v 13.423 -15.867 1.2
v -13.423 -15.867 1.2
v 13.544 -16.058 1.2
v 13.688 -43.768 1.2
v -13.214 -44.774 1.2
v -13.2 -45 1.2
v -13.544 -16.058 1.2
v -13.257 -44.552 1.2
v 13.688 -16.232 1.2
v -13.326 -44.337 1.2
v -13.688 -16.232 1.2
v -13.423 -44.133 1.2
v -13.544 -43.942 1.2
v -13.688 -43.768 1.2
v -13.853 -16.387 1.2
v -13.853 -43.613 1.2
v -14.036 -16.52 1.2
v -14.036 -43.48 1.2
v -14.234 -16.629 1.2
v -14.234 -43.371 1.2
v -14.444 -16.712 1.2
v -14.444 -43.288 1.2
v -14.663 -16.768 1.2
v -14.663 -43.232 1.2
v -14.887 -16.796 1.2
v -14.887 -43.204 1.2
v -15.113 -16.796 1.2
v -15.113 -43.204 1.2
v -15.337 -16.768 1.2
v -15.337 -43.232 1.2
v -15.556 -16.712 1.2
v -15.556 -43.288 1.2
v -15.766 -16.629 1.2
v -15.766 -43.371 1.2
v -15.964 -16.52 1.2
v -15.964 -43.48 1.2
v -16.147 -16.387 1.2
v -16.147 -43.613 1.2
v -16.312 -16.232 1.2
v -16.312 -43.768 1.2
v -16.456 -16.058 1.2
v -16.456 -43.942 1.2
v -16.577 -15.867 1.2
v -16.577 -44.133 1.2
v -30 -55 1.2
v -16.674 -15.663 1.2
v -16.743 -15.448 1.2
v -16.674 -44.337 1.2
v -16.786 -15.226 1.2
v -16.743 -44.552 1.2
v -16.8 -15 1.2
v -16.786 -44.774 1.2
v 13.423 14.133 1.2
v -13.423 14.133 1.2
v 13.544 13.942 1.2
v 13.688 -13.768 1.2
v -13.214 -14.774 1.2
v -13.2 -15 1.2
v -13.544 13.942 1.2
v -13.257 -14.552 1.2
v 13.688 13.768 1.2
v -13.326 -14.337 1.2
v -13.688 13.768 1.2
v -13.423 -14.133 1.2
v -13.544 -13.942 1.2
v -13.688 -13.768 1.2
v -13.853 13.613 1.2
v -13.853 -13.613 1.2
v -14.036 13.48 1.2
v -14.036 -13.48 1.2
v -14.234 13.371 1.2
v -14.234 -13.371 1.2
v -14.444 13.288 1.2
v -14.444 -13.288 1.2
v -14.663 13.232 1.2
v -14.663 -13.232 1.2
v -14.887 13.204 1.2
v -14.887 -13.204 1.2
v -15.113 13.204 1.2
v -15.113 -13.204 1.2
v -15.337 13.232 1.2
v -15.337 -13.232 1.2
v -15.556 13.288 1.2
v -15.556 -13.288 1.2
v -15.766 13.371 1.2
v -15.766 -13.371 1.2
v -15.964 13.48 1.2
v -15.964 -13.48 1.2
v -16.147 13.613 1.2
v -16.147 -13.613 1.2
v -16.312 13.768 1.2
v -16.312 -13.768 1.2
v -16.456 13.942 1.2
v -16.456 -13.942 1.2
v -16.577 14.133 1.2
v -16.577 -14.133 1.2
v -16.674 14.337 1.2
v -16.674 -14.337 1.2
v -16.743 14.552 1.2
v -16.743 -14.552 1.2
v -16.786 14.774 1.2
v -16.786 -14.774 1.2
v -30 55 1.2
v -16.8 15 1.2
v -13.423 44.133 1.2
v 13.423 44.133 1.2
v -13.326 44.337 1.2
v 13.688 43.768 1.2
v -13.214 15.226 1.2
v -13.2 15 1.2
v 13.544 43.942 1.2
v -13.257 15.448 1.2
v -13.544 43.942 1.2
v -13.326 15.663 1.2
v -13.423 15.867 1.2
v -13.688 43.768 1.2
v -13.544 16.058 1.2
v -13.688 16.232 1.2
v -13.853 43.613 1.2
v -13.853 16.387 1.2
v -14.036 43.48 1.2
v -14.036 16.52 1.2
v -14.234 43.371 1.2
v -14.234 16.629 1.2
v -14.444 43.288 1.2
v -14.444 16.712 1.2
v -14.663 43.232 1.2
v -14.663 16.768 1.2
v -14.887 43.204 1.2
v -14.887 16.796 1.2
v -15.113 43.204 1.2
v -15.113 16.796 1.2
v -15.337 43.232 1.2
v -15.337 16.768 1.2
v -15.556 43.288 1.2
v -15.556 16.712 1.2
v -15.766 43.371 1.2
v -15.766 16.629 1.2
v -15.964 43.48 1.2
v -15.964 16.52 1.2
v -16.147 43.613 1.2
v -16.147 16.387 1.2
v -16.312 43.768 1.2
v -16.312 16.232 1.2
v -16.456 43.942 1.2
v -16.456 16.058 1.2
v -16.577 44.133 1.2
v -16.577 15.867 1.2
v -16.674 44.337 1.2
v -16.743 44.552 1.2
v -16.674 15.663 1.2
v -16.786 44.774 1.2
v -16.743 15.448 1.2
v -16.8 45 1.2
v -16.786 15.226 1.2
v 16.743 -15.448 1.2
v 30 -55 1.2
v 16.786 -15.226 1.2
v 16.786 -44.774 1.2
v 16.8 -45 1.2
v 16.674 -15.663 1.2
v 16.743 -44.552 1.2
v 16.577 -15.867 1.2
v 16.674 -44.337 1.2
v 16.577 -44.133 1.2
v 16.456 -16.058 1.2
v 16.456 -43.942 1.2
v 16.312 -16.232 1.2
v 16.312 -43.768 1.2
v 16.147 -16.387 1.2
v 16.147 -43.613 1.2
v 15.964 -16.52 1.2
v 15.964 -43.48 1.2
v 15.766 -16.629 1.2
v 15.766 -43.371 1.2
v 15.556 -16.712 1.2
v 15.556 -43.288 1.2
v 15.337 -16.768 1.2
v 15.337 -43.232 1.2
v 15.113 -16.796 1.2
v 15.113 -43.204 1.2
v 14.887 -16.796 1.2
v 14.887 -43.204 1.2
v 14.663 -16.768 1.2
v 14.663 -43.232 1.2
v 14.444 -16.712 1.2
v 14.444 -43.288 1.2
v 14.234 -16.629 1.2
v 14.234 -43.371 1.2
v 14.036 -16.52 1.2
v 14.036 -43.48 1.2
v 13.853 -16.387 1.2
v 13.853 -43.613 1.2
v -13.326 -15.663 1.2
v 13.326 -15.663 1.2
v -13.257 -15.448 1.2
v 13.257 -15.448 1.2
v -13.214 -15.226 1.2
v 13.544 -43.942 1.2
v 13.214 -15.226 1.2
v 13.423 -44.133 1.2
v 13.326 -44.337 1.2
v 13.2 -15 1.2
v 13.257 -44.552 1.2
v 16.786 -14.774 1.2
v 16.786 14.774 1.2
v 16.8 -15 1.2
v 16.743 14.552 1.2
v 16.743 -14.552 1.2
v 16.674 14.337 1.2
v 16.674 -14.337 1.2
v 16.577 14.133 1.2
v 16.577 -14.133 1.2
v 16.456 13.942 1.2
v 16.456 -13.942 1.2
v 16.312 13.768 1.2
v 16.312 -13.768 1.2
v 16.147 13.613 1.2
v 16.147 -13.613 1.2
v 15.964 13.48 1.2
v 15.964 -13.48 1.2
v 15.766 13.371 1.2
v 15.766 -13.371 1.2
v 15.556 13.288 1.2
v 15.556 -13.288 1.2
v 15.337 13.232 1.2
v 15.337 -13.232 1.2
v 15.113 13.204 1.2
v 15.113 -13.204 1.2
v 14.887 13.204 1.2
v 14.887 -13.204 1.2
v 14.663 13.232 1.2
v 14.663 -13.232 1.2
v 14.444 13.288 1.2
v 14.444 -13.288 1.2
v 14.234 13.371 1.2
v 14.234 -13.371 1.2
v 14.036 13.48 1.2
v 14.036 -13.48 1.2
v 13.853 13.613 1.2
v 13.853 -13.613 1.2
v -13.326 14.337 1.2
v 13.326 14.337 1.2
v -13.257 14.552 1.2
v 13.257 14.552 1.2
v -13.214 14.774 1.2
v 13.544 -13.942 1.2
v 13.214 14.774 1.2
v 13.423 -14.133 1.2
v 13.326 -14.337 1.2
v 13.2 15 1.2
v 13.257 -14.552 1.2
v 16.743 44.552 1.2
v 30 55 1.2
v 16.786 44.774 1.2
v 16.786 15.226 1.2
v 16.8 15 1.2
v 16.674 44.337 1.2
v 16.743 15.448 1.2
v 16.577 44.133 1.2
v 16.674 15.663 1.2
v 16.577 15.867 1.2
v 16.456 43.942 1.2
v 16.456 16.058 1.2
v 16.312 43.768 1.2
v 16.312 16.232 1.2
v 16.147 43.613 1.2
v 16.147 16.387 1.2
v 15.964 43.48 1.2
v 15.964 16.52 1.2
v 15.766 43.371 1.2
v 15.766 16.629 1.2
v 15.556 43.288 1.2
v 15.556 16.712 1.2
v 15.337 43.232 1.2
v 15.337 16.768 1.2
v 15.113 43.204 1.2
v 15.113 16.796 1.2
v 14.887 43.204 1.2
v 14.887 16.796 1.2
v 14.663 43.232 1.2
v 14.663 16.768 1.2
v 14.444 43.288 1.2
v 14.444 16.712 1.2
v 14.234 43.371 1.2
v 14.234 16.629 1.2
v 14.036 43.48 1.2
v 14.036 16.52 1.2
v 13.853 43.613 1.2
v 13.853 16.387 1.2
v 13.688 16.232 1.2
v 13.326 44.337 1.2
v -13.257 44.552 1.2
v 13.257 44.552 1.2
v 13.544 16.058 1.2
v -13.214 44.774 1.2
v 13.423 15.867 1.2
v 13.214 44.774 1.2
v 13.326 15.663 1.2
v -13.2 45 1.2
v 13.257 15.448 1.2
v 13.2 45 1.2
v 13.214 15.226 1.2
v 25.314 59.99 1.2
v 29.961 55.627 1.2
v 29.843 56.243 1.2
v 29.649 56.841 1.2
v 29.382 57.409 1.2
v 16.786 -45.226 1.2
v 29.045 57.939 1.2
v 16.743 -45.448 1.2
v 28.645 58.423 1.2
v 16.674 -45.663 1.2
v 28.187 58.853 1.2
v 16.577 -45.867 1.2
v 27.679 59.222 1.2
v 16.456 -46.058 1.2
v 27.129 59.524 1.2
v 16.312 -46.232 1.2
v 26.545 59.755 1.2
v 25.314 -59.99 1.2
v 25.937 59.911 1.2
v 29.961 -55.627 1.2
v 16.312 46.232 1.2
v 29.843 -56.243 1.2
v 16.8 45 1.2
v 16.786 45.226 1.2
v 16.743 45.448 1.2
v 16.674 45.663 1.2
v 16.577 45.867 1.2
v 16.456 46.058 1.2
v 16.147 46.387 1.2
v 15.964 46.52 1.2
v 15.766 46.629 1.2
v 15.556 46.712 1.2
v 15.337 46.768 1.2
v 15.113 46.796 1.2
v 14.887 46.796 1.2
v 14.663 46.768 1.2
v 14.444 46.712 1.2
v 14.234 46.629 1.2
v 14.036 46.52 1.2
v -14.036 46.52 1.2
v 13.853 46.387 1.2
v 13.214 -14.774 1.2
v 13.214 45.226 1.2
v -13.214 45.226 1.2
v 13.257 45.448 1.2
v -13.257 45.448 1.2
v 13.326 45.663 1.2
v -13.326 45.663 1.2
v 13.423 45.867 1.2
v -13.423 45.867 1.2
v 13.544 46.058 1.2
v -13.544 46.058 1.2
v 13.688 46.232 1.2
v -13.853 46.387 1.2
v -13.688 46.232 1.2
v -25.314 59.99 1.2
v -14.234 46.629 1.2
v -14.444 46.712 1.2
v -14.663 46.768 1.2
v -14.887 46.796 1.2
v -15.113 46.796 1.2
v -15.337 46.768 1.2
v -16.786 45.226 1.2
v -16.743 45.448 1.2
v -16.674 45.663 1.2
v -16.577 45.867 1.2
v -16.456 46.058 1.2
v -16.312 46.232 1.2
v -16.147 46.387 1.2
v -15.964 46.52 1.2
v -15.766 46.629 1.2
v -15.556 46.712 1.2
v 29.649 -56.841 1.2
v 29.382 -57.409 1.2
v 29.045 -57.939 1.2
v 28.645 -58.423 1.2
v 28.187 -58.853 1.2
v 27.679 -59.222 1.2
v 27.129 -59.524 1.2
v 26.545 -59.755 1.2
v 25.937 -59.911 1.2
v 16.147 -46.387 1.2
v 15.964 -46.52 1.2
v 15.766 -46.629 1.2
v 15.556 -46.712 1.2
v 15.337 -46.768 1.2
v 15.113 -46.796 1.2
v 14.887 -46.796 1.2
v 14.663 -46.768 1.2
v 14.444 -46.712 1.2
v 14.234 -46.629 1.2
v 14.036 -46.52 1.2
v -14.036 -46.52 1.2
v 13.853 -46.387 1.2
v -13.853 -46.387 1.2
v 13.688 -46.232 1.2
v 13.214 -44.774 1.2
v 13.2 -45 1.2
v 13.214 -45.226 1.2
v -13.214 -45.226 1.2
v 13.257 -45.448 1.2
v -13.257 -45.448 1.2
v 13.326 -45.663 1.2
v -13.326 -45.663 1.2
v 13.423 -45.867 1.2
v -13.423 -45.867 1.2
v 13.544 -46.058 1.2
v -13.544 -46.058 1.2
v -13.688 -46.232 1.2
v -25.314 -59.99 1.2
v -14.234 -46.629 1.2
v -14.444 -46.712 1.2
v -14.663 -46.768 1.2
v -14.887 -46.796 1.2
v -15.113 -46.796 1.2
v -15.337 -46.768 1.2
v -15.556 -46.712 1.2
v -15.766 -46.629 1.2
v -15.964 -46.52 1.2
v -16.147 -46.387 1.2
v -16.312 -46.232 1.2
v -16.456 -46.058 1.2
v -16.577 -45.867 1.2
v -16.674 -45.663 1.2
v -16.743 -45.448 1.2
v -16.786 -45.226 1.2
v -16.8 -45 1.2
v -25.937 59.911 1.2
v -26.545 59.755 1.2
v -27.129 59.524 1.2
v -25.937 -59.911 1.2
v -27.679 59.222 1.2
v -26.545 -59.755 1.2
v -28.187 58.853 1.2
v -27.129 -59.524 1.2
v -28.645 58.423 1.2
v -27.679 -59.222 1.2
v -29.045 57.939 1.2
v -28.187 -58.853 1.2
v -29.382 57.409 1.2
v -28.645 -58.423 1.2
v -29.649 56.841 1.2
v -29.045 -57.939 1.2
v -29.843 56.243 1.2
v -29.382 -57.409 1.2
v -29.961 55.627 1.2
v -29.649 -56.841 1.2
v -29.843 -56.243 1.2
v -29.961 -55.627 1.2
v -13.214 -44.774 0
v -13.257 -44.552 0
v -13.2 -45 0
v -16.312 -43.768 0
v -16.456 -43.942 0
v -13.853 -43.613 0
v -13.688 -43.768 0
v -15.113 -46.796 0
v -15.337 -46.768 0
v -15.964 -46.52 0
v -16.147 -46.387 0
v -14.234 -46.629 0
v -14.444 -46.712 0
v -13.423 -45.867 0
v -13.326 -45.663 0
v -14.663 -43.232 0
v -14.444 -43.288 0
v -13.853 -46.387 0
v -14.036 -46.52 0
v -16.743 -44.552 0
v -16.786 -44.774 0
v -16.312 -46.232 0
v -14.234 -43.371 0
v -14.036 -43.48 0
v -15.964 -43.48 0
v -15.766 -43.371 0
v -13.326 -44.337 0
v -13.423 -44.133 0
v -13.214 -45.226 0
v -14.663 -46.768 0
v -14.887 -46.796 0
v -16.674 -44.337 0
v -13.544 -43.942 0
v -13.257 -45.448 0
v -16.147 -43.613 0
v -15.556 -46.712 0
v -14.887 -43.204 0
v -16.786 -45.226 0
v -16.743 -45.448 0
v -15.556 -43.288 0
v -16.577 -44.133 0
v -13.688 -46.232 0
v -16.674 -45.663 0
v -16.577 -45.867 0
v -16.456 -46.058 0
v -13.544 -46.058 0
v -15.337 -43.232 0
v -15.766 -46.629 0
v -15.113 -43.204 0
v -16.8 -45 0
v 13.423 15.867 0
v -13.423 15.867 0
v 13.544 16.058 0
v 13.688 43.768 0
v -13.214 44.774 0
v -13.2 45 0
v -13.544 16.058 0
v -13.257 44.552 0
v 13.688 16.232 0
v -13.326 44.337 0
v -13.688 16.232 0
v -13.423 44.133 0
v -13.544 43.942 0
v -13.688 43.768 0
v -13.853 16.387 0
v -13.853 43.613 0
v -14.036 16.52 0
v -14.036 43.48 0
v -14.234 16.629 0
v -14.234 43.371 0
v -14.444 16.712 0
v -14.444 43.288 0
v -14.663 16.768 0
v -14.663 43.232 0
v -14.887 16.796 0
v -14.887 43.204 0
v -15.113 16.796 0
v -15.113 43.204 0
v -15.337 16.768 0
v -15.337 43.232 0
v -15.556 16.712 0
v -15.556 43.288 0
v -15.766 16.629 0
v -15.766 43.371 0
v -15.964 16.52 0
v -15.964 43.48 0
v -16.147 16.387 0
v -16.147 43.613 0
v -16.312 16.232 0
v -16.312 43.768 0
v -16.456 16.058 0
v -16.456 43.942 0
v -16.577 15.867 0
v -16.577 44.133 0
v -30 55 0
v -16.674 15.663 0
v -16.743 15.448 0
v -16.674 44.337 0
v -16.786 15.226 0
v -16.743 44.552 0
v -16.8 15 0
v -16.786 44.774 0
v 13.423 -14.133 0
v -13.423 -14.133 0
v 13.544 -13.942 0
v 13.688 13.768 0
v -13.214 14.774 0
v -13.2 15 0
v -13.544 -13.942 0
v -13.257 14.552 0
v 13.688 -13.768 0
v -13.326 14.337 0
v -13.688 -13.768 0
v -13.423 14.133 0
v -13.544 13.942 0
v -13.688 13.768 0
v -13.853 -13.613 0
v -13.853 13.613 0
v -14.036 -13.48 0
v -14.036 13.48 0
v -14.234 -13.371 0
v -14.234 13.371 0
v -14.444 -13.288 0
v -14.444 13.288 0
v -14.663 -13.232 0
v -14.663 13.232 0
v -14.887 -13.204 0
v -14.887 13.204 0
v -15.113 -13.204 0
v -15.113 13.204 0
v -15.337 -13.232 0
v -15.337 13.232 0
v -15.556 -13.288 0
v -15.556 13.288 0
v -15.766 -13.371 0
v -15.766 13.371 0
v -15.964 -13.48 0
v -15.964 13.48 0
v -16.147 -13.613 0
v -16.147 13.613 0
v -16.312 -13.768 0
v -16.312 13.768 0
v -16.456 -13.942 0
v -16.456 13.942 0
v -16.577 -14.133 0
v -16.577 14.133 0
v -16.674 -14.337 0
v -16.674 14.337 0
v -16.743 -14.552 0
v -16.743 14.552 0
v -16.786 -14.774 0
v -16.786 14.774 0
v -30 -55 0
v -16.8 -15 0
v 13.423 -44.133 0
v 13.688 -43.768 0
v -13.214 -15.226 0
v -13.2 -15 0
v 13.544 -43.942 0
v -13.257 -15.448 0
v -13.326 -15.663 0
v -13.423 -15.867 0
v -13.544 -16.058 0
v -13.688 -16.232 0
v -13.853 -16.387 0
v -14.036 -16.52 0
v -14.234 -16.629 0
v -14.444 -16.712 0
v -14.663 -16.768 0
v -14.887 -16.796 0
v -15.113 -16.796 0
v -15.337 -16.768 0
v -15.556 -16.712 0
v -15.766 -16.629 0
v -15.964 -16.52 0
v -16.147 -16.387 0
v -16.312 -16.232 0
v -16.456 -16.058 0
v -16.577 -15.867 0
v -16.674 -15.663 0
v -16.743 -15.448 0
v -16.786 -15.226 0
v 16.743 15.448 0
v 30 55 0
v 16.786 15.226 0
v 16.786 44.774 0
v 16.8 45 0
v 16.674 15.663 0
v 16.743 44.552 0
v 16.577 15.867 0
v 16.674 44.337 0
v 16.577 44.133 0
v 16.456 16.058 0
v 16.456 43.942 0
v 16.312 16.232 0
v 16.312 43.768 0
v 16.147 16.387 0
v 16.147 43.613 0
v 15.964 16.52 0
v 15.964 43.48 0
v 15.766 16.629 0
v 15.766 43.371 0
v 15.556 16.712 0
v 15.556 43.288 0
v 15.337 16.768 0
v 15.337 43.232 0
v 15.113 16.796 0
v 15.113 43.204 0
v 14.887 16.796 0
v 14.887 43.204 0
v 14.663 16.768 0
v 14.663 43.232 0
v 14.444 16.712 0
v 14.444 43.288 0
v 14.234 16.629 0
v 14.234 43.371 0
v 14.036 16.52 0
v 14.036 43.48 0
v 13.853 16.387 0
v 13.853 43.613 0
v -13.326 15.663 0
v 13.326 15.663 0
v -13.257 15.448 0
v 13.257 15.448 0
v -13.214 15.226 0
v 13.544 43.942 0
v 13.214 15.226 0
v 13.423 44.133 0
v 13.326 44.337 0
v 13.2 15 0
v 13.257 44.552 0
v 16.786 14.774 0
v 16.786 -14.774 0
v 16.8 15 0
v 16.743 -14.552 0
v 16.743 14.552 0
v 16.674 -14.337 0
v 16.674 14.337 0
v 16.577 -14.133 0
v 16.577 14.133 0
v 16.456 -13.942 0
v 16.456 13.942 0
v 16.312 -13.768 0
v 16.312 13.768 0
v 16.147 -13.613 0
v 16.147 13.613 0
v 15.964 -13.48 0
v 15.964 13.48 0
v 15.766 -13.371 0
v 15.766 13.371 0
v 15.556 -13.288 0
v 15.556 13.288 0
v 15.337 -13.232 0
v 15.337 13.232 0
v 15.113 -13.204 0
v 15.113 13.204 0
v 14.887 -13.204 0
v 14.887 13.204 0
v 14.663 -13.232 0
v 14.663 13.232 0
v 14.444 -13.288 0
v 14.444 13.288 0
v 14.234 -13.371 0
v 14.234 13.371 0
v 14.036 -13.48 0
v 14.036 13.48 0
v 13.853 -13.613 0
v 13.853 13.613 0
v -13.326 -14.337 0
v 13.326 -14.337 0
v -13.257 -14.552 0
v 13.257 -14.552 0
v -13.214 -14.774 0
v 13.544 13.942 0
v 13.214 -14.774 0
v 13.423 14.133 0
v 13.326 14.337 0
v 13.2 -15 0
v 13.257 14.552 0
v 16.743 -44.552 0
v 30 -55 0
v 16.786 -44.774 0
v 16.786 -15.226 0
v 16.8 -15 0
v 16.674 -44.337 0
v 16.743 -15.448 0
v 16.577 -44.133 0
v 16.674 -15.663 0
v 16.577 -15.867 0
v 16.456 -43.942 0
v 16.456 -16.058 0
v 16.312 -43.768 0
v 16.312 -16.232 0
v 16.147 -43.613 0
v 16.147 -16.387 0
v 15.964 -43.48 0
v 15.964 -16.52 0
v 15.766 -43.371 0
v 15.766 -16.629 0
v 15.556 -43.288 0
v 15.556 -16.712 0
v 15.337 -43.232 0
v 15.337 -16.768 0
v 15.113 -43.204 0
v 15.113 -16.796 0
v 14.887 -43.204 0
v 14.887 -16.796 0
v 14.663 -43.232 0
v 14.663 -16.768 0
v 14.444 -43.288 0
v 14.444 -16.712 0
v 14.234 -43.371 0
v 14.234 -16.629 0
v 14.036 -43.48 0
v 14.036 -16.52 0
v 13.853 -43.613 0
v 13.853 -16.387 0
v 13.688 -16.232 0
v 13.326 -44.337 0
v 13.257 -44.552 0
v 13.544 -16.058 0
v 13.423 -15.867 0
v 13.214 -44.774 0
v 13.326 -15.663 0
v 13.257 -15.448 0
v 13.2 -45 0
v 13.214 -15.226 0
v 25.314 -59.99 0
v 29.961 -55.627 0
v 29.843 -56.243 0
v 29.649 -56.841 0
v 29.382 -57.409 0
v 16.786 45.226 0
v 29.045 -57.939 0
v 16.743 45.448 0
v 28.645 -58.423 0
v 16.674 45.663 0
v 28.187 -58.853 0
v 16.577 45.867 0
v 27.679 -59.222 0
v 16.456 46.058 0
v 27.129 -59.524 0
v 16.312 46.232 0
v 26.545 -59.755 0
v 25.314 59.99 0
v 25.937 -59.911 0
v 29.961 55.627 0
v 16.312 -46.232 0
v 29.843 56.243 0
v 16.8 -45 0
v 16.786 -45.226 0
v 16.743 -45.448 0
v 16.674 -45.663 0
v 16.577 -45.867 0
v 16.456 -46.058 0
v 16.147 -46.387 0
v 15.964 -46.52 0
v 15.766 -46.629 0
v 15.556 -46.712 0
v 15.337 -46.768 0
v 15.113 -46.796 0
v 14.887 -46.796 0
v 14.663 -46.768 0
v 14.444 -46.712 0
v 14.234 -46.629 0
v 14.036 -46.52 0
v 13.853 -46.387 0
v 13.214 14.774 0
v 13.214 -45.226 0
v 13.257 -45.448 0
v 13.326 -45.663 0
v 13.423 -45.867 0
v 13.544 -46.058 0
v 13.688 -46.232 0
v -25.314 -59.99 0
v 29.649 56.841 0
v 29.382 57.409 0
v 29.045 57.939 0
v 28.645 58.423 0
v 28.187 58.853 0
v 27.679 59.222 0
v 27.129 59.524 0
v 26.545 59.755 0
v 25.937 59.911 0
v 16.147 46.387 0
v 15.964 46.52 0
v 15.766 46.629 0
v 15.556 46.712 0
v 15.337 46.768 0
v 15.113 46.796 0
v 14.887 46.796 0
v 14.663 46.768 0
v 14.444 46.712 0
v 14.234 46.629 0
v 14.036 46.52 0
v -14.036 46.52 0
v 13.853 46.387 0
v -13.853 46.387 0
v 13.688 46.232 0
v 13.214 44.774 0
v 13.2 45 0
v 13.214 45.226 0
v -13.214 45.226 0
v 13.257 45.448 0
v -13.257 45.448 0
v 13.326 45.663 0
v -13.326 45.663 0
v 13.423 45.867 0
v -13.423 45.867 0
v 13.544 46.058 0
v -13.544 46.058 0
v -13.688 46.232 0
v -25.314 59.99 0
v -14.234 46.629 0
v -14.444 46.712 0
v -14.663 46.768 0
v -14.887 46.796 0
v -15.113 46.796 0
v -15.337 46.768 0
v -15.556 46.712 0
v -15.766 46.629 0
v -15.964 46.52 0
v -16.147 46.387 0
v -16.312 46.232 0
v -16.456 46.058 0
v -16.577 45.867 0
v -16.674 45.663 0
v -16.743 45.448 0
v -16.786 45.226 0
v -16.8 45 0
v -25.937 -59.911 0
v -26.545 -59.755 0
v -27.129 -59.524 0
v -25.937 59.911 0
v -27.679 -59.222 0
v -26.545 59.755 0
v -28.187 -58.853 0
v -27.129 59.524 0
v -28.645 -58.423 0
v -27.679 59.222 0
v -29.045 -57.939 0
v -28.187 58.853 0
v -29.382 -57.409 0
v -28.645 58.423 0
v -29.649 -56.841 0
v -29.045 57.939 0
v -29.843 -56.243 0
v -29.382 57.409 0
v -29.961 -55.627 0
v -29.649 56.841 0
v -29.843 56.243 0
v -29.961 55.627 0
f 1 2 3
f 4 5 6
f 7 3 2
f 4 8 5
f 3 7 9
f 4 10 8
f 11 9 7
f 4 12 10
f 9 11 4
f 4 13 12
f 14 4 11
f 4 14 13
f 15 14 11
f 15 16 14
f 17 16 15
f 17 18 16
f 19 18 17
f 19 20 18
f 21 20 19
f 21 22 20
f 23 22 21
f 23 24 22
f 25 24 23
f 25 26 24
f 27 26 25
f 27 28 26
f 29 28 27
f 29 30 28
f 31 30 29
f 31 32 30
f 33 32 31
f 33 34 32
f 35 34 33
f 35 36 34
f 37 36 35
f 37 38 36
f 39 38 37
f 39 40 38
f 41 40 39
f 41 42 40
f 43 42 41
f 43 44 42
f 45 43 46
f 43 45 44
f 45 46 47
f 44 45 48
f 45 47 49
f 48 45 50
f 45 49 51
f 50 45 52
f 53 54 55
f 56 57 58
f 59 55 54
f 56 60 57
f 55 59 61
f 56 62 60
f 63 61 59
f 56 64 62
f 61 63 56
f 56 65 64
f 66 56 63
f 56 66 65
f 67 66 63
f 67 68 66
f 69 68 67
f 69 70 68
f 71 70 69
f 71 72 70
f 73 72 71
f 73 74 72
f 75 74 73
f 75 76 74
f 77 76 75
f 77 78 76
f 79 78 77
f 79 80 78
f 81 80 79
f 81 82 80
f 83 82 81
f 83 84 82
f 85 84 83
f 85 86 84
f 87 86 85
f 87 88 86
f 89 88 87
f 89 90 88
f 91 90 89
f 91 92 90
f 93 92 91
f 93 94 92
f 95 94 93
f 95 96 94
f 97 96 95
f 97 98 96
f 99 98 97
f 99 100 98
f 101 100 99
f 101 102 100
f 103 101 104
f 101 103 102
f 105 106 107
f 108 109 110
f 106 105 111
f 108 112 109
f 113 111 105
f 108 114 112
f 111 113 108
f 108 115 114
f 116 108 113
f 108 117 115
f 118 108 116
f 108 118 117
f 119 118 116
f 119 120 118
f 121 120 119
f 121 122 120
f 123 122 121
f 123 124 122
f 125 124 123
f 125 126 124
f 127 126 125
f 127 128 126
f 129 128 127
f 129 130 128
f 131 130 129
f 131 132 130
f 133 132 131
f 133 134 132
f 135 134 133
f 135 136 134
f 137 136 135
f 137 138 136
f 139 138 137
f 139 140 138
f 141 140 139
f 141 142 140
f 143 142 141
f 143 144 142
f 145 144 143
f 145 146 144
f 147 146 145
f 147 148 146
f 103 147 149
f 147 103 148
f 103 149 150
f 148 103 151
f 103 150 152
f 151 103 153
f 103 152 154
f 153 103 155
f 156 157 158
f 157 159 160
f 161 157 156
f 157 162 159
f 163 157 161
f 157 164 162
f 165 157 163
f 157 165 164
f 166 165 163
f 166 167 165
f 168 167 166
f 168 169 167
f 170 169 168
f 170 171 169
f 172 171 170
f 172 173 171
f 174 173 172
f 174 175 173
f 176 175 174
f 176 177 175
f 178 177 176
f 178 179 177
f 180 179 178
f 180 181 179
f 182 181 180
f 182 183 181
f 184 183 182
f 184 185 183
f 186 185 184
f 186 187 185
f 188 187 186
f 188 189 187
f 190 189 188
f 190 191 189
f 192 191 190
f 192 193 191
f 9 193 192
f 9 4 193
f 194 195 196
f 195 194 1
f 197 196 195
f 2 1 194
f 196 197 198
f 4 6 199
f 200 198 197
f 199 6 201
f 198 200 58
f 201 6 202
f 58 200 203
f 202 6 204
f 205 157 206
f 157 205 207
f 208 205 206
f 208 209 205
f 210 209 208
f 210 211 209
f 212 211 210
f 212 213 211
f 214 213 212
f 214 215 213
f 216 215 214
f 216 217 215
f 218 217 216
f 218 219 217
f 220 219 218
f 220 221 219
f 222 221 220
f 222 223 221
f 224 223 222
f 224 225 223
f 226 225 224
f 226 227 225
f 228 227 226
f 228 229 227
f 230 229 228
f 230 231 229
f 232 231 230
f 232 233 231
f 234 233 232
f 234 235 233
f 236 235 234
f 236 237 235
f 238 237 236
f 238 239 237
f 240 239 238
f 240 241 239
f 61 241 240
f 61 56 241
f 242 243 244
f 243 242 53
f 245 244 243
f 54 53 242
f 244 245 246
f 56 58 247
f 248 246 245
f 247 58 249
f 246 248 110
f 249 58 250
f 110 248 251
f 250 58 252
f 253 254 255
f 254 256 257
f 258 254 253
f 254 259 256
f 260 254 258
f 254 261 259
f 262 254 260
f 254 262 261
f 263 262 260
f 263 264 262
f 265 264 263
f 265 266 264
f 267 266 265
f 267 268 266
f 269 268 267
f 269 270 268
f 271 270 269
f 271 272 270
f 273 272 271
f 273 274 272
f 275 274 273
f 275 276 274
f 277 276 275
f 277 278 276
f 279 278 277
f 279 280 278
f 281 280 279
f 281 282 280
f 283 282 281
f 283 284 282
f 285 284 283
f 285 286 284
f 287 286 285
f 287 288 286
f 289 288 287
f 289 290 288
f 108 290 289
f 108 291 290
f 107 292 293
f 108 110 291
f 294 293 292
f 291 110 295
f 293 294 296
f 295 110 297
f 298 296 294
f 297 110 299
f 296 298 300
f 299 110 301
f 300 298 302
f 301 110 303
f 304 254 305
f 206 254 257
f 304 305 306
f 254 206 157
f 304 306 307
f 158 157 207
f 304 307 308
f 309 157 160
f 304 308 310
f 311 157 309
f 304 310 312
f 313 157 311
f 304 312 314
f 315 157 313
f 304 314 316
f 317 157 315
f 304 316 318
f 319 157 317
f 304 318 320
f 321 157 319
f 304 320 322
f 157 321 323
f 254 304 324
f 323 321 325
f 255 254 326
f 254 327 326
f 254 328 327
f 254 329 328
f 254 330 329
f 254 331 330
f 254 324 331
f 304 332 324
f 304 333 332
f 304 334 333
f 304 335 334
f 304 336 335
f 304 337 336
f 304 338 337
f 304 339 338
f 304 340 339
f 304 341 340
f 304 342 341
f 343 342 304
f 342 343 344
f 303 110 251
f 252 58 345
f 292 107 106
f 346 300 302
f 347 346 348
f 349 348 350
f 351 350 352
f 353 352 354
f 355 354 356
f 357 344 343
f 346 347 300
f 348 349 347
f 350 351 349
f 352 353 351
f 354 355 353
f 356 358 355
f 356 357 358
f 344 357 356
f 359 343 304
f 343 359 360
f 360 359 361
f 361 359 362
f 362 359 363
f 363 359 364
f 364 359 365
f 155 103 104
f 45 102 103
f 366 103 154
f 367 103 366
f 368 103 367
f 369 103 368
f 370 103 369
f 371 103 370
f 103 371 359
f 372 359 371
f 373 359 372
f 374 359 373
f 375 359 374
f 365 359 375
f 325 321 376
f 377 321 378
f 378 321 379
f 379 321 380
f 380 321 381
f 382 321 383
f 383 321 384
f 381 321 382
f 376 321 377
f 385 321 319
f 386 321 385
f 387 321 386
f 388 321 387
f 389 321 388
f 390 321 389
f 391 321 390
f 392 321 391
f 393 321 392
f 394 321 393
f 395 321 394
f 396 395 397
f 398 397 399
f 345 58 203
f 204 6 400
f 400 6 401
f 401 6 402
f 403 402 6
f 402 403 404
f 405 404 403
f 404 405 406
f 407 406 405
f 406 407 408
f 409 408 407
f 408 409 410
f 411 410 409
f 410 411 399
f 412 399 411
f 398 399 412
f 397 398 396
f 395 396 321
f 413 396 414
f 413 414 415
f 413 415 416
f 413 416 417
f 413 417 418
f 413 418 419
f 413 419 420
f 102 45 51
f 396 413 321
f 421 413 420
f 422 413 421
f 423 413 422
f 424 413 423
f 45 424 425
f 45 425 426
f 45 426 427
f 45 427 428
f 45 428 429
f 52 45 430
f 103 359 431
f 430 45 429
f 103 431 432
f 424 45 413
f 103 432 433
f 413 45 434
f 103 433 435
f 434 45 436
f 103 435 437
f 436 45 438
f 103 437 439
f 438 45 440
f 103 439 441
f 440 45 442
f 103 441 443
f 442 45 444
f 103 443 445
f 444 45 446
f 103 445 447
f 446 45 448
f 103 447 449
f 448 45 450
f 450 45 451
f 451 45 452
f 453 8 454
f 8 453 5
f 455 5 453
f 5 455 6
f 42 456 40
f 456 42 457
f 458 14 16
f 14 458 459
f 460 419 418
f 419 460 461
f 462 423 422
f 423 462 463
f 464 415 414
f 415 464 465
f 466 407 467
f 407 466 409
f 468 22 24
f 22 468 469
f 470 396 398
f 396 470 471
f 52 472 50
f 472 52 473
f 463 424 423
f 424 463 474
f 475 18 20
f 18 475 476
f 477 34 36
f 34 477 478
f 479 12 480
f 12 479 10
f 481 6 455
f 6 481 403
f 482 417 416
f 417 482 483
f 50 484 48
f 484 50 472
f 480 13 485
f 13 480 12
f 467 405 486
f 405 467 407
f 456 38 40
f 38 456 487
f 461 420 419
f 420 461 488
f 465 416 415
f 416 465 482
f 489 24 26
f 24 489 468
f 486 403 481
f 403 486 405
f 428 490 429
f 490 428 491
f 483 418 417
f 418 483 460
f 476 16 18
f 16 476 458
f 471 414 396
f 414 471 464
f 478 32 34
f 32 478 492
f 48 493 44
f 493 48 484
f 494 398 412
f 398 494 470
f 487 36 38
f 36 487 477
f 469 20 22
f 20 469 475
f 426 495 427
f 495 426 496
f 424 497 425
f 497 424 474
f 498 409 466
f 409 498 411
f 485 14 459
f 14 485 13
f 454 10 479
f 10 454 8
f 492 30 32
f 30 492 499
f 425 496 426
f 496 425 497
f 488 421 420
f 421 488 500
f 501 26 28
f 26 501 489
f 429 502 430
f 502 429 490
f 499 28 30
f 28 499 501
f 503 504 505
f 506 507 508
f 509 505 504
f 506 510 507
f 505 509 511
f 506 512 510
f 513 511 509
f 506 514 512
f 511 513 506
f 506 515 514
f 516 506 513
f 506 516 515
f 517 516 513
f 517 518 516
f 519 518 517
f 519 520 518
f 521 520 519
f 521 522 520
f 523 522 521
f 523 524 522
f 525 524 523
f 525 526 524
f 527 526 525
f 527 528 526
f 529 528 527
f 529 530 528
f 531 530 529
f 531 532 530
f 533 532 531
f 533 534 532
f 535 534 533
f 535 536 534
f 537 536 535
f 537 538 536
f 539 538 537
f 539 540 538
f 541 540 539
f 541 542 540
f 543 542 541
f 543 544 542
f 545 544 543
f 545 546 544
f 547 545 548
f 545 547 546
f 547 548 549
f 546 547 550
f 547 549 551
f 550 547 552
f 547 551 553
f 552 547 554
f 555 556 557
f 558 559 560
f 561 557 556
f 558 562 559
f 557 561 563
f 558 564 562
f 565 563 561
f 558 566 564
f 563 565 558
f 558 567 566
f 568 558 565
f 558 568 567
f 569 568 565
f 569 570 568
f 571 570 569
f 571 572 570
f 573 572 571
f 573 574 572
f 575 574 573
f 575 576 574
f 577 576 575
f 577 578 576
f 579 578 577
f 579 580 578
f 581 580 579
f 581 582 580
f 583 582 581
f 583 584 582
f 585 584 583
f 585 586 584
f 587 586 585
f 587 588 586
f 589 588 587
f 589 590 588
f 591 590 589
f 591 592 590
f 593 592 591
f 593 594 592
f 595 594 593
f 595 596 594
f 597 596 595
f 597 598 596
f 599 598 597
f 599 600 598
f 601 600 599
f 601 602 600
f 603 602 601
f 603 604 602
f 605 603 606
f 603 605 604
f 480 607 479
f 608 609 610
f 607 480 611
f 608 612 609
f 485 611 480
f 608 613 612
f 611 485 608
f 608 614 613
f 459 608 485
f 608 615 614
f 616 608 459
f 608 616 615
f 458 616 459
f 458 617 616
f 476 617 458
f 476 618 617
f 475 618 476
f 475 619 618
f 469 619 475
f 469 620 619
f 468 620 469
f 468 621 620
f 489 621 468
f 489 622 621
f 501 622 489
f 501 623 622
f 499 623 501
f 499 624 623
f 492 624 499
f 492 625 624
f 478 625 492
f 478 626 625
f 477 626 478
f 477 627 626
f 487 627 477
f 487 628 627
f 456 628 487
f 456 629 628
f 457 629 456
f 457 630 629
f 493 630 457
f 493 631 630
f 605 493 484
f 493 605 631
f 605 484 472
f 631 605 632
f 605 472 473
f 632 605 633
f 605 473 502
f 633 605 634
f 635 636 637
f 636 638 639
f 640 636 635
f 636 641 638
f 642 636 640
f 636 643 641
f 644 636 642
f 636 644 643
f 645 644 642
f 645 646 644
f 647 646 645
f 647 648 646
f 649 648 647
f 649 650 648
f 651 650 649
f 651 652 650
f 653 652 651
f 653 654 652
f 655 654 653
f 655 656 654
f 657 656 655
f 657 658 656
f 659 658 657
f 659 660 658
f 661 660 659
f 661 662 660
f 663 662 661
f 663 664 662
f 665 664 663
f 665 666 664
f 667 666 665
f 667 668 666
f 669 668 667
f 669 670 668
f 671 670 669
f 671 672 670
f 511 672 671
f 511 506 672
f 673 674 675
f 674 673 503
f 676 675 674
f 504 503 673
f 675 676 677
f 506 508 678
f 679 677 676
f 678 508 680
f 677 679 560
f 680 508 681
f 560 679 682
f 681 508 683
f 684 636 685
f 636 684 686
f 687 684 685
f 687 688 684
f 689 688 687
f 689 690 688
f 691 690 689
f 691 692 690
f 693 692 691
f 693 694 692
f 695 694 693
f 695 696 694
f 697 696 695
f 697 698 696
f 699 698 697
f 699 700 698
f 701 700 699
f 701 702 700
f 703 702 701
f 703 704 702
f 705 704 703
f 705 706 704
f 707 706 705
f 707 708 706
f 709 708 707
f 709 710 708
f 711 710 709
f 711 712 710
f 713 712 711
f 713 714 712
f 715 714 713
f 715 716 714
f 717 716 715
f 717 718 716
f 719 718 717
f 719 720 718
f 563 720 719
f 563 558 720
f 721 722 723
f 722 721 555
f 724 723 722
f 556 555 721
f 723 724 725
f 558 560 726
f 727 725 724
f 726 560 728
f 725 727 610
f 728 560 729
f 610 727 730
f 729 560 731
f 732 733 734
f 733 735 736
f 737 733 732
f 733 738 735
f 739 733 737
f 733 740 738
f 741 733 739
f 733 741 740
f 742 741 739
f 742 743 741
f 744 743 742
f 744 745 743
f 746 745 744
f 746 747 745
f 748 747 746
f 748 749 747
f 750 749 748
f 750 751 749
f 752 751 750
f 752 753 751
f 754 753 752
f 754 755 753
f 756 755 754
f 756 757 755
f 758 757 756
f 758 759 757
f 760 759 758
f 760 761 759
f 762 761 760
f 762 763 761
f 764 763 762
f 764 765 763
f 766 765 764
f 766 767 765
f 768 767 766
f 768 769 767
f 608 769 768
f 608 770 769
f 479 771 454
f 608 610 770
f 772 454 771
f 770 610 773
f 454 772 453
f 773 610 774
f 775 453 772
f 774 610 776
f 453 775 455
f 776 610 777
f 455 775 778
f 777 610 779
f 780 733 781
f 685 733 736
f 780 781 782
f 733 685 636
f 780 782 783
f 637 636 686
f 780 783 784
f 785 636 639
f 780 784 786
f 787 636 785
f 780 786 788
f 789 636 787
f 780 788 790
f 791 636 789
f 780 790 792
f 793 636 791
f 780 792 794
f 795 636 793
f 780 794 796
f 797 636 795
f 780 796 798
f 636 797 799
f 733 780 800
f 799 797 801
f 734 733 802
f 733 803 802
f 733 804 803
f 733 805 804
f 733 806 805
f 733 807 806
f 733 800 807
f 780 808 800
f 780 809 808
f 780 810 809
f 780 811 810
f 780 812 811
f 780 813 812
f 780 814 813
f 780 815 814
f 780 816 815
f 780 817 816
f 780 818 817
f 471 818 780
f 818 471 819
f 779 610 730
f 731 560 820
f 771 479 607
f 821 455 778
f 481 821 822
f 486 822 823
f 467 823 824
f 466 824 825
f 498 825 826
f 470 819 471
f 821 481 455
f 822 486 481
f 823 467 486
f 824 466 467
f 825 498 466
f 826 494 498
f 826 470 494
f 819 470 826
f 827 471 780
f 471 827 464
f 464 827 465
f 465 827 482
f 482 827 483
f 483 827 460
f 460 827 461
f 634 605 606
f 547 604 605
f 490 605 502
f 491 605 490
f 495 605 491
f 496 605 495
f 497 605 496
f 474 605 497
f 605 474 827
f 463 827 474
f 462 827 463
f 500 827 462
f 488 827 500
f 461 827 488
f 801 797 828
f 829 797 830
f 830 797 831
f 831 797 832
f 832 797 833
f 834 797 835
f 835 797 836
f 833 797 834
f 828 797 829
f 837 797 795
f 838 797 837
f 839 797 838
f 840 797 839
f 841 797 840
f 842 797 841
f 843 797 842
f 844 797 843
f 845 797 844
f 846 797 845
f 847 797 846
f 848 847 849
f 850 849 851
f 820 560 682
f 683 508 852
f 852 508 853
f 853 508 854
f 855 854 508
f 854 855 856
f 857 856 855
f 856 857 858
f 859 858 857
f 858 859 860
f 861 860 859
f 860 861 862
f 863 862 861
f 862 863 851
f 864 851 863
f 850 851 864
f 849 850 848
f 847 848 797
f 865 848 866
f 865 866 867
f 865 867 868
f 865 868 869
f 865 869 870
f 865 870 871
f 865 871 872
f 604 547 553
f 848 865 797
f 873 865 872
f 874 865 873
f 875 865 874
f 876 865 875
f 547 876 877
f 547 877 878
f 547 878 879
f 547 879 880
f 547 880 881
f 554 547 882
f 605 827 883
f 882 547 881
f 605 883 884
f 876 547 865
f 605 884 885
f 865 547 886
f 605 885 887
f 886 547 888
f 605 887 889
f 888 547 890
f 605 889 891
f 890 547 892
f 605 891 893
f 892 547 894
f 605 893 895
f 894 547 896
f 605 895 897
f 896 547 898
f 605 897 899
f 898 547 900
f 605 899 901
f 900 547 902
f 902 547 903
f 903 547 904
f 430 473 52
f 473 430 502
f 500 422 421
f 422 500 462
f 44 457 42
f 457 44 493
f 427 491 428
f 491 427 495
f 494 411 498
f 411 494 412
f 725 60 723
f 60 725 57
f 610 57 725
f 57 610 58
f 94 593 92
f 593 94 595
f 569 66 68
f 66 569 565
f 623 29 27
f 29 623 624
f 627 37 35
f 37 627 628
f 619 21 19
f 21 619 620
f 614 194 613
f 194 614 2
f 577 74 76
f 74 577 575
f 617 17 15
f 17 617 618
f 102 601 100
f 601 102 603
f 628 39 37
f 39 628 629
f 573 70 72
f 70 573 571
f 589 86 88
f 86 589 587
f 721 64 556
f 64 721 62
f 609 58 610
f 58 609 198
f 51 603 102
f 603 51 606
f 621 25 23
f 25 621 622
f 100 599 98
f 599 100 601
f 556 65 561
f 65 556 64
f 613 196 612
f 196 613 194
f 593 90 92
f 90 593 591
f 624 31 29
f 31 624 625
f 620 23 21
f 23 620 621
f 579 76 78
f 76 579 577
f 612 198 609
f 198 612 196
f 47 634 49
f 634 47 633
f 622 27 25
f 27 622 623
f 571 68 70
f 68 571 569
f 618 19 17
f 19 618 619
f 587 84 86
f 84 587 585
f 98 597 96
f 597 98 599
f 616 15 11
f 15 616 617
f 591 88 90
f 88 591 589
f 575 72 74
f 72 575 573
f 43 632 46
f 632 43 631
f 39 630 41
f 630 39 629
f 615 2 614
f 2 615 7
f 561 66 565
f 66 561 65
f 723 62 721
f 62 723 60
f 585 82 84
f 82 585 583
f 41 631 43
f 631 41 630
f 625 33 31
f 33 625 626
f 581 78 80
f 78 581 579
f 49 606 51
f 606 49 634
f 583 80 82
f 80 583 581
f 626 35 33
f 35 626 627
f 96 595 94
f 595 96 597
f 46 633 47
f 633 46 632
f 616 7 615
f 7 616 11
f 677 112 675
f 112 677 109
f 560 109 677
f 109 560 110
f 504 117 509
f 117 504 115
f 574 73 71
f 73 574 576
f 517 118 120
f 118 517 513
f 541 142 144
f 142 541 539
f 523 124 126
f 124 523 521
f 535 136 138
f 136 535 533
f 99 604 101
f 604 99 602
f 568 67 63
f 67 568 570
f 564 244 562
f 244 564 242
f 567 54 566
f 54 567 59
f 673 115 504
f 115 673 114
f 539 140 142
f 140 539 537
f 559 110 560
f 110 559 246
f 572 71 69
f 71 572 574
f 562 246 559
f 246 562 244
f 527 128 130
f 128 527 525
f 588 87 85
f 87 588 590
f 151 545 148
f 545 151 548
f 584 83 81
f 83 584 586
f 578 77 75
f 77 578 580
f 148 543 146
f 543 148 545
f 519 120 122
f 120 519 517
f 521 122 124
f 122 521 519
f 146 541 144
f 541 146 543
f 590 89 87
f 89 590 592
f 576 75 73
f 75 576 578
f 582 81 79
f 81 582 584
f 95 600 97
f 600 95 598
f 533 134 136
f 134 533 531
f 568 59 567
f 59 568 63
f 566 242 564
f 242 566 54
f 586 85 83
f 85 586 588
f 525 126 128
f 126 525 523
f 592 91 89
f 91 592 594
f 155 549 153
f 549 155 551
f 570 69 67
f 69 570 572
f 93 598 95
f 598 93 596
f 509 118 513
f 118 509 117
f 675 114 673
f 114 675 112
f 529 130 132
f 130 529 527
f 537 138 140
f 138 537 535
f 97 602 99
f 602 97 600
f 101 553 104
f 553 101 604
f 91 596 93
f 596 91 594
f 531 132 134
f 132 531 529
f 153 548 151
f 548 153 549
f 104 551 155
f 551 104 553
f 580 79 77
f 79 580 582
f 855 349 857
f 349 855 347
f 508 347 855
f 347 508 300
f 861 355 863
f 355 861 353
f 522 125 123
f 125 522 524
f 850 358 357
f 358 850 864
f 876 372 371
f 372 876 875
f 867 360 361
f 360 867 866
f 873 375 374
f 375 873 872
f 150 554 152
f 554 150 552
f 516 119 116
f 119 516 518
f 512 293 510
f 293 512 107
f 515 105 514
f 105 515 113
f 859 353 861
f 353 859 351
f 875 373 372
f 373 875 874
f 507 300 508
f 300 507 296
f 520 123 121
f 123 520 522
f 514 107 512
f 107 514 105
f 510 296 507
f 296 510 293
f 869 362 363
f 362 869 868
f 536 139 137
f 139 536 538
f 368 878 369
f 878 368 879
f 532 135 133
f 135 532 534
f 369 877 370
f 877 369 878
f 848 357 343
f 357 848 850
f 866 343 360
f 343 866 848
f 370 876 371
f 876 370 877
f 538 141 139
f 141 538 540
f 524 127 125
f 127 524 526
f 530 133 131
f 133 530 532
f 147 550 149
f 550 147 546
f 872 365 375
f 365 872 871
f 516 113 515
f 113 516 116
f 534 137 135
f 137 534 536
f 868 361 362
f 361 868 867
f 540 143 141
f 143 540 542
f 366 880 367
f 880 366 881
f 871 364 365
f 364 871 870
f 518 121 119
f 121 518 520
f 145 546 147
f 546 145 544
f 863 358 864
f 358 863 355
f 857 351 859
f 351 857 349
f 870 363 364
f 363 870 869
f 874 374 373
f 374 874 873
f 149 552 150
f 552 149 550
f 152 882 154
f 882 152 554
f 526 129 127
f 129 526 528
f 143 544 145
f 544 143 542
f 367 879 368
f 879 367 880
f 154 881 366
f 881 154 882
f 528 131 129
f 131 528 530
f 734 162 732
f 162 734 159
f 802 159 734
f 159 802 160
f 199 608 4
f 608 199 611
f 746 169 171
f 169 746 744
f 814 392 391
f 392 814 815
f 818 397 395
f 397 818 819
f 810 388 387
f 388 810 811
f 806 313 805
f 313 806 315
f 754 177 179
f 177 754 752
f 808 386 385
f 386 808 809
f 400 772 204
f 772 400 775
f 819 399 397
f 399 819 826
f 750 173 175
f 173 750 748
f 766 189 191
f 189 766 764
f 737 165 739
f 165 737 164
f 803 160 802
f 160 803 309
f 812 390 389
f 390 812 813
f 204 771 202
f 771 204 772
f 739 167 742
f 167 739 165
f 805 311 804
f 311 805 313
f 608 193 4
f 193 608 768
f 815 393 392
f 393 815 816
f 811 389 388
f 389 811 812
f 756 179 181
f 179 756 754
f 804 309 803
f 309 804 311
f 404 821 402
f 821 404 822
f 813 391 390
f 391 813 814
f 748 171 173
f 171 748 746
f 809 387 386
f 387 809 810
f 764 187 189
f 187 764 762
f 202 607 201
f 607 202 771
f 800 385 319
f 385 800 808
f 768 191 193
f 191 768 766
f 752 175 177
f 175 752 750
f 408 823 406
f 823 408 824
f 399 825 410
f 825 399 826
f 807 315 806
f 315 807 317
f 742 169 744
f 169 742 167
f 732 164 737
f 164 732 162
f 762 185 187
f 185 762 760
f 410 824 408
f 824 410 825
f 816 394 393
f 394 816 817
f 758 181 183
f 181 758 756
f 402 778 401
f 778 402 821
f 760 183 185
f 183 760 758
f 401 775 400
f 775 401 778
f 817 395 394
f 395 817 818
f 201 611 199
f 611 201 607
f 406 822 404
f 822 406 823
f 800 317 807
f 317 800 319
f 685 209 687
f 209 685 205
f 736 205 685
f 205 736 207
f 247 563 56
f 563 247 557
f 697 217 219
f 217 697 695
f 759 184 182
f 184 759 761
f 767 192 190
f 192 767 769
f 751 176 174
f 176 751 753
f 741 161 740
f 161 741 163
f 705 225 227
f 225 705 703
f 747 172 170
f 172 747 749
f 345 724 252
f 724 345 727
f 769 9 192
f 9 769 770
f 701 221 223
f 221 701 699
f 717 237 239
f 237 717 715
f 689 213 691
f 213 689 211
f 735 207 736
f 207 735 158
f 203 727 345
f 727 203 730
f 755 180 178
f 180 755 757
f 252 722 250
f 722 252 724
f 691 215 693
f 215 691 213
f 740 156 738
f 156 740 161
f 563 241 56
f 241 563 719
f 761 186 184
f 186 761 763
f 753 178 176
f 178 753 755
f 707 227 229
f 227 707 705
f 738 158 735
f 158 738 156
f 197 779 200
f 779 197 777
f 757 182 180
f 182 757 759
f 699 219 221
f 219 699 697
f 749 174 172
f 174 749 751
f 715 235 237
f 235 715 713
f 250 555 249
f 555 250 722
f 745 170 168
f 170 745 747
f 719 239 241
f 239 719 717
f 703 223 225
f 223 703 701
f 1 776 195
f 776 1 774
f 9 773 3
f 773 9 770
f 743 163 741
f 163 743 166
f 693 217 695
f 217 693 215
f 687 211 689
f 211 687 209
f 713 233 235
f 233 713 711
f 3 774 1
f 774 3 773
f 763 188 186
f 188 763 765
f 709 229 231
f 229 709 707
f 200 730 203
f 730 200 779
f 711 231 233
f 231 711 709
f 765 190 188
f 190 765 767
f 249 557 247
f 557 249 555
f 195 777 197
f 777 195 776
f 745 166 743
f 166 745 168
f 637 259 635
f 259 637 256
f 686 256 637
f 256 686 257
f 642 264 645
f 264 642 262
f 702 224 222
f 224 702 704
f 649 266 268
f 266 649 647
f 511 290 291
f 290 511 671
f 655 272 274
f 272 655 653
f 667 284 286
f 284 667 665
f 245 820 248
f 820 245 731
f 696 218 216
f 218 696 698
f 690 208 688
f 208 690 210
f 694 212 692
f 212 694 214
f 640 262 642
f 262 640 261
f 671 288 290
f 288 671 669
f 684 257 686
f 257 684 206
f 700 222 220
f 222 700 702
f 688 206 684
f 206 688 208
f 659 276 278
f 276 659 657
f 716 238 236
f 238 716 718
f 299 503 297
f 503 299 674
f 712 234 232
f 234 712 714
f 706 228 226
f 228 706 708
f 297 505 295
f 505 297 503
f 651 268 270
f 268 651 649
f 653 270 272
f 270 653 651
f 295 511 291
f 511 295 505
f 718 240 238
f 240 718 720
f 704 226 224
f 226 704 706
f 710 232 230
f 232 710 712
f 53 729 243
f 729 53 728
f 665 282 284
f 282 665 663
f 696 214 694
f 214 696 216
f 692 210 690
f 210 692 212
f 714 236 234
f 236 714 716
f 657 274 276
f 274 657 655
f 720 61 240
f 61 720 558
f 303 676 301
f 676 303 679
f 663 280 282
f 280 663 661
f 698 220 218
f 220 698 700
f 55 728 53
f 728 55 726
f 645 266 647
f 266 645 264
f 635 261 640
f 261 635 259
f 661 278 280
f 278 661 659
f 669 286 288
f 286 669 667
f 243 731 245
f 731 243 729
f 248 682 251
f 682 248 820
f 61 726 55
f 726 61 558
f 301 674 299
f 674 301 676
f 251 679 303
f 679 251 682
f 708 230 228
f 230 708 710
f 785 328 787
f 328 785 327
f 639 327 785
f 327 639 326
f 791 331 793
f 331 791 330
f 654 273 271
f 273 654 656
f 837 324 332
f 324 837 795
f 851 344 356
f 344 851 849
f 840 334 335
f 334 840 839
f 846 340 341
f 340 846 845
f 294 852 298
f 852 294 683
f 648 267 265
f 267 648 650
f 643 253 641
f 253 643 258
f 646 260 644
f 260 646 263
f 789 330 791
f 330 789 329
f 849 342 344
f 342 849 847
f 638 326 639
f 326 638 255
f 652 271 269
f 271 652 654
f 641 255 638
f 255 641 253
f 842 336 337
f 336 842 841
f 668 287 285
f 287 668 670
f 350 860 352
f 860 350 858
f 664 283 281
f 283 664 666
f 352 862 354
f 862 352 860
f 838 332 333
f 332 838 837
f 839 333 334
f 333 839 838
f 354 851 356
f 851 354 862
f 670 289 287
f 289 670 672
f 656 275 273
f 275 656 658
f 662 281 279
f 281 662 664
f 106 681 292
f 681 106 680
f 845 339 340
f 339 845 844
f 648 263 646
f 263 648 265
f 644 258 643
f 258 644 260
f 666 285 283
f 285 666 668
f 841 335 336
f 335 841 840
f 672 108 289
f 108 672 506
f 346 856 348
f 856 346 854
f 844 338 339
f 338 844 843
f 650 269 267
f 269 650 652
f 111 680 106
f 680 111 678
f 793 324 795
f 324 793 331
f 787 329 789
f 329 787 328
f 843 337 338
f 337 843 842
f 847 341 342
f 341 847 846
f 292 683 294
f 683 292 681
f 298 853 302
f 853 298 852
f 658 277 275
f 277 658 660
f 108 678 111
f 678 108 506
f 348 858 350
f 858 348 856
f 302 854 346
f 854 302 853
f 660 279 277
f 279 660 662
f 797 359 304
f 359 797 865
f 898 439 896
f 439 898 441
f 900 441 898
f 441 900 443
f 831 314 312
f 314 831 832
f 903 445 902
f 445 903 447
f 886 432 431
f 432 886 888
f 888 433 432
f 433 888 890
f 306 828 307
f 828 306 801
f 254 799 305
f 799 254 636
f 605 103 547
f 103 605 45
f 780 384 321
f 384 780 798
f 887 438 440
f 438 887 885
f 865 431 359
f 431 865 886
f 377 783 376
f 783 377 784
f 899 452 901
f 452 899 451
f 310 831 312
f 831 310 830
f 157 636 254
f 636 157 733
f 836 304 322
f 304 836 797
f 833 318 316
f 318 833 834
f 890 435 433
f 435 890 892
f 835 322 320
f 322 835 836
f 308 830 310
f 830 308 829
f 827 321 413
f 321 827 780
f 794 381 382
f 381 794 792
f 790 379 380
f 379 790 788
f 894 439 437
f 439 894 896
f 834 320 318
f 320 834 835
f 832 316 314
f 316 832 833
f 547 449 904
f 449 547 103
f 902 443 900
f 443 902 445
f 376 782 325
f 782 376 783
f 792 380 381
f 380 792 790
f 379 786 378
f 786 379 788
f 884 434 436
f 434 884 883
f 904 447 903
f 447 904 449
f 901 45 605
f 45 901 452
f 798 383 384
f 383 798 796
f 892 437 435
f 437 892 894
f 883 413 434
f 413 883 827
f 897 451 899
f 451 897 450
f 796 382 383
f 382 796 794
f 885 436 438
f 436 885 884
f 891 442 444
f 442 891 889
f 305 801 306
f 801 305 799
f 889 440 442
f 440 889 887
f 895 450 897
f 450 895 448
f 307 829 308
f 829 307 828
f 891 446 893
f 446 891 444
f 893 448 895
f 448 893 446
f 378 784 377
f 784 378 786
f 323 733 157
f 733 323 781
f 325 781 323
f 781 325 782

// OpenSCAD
$fn = 50;


difference() {
	union() {
		hull() {
			translate(v = [-25.0000000000, 55.0000000000, 0]) {
				cylinder(h = 15, r = 5);
			}
			translate(v = [25.0000000000, 55.0000000000, 0]) {
				cylinder(h = 15, r = 5);
			}
			translate(v = [-25.0000000000, -55.0000000000, 0]) {
				cylinder(h = 15, r = 5);
			}
			translate(v = [25.0000000000, -55.0000000000, 0]) {
				cylinder(h = 15, r = 5);
			}
		}
	}
	union() {
		translate(v = [0, 0, 1.2000000000]) {
			hull() {
				translate(v = [-25.0000000000, 55.0000000000, 0]) {
					cylinder(h = 13.8000000000, r = 3.8000000000);
				}
				translate(v = [25.0000000000, 55.0000000000, 0]) {
					cylinder(h = 13.8000000000, r = 3.8000000000);
				}
				translate(v = [-25.0000000000, -55.0000000000, 0]) {
					cylinder(h = 13.8000000000, r = 3.8000000000);
				}
				translate(v = [25.0000000000, -55.0000000000, 0]) {
					cylinder(h = 13.8000000000, r = 3.8000000000);
				}
			}
		}
		#translate(v = [-15.0000000000, -45.0000000000, 0]) {
			cylinder(h = 1.2000000000, r = 1.8000000000);
		}
		#translate(v = [-15.0000000000, -15.0000000000, 0]) {
			cylinder(h = 1.2000000000, r = 1.8000000000);
		}
		#translate(v = [-15.0000000000, 15.0000000000, 0]) {
			cylinder(h = 1.2000000000, r = 1.8000000000);
		}
		#translate(v = [-15.0000000000, 45.0000000000, 0]) {
			cylinder(h = 1.2000000000, r = 1.8000000000);
		}
		#translate(v = [15.0000000000, -45.0000000000, 0]) {
			cylinder(h = 1.2000000000, r = 1.8000000000);
		}
		#translate(v = [15.0000000000, -15.0000000000, 0]) {
			cylinder(h = 1.2000000000, r = 1.8000000000);
		}
		#translate(v = [15.0000000000, 15.0000000000, 0]) {
			cylinder(h = 1.2000000000, r = 1.8000000000);
		}
		#translate(v = [15.0000000000, 45.0000000000, 0]) {
			cylinder(h = 1.2000000000, r = 1.8000000000);
		}
		translate(v = [-250.0000000000, -250.0000000000, 1.2000000000]) {
			cube(size = [500, 500, 500]);
		}
		translate(v = [-250.0000000000, -250.0000000000, 1.2000000000]) {
			cube(size = [500, 500, 500]);
		}
		translate(v = [-250.0000000000, -250.0000000000, 1.2000000000]) {
			cube(size = [500, 500, 500]);
		}
	}
}
